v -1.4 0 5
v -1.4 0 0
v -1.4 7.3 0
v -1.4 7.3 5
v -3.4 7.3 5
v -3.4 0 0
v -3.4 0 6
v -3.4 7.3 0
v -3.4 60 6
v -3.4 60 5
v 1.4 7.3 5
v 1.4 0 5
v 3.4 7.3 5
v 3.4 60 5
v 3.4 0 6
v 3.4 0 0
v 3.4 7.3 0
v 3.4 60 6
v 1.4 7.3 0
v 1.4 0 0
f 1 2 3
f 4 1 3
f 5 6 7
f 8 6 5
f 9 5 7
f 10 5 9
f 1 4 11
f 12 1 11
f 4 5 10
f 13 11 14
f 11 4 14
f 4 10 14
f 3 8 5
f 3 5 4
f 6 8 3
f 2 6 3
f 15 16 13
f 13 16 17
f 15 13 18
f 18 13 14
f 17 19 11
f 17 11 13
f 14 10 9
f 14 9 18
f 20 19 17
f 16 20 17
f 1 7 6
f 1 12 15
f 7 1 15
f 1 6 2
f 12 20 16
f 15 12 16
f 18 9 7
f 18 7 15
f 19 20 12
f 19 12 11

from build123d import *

# Parameters (mm, degrees)
F0_W     = 2
F0_H     = 7.3
F1_DEPTH = 5
F2_W     = 6.8
F2_H     = 60
F3_DEPTH = 1


with BuildPart() as f1:
    # F0 (on Top) → F1 (new body)
    with BuildSketch(Plane.XY):
        with Locations((-2.4, 3.65)):
            Rectangle(F0_W, F0_H)
    extrude(amount=F1_DEPTH)



with BuildPart() as f1b:
    # F0 (on Top) → F1, piece 2 (new body)
    with BuildSketch(Plane.XY):
        with Locations((2.4, 3.65)):
            Rectangle(F0_W, F0_H)
    extrude(amount=F1_DEPTH)


with BuildPart() as f1_1:
    add(f1.part)

    add(f1b.part)  # F3 merges F1b
    # F2 (on face) → F3 (join)
    with BuildSketch(Plane.XY.offset(5)):
        with Locations((0, 30)):
            Rectangle(F2_W, F2_H)
    extrude(amount=F3_DEPTH)


solid = f1_1.part
